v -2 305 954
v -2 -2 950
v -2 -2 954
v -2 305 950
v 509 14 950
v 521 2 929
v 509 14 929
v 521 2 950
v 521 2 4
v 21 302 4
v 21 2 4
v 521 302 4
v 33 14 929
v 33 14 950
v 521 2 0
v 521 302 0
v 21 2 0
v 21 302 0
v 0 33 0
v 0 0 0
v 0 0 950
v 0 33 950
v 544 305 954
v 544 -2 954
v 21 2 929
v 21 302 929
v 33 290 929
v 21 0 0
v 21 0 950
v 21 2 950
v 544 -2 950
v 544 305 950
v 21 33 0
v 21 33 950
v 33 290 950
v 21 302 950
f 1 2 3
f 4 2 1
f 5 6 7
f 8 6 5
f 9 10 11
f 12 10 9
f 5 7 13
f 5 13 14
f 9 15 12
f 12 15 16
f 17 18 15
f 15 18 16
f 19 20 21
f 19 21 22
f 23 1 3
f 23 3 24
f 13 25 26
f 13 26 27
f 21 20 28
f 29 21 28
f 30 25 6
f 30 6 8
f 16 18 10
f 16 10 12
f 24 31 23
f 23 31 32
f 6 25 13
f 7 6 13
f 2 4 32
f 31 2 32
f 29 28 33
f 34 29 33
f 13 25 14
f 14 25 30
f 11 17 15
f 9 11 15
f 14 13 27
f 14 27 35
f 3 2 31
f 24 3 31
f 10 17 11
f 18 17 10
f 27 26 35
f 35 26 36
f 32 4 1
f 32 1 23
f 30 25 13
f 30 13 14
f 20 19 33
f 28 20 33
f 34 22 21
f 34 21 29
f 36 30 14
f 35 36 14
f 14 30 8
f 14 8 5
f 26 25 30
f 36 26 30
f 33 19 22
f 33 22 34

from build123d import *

# Parameters (mm, degrees)
F0_W      = 21
F0_H      = 33
F1_DEPTH  = 950
F3_W      = 12
F3_H      = 21
F4_DEPTH  = 300
F5_SIZE   = 11.99999
F6_W      = 12
F6_H      = 21
F7_DEPTH  = 500
F8_SIZE   = 11.99999
F9_W      = 546
F9_H      = 307
F10_DEPTH = 4
F11_W     = 500
F11_H     = 300
F12_DEPTH = 4


# Not quite as in the source:
# - a fillet or chamfer is up to 0.001 mm smaller than in the source, because OpenCascade refuses the exact size


with BuildPart() as f1:
    # F0 (on Top) → F1 (new body)
    with BuildSketch(Plane.XY):
        with Locations((10.5, 16.5)):
            Rectangle(F0_W, F0_H)
    extrude(amount=F1_DEPTH)


with BuildPart() as f4:
    # F3 (on offset) → F4 (new body)
    with BuildSketch(Plane.XZ.offset(-2)):
        with Locations((27, 939.5)):
            Rectangle(F3_W, F3_H)
    extrude(amount=-F4_DEPTH)

    # F5 (size 12 in the source; OpenCascade refuses exactly that, so slightly less here)
    f5_edges = [f4.edges().sort_by_distance(p)[0] for p in [
        (33, 2, 939.5),
        (33, 302, 939.5),
    ]]
    chamfer(f5_edges, length=F5_SIZE)


with BuildPart() as f7:
    # F6 (on face) → F7 (new body)
    with BuildSketch(Plane.YZ.offset(21)):
        with Locations((8, 939.5)):
            Rectangle(F6_W, F6_H)
    extrude(amount=F7_DEPTH)

    # F8 (size 12 in the source; OpenCascade refuses exactly that, so slightly less here)
    f8_edges = [f7.edges().sort_by_distance(p)[0] for p in [
        (21, 14, 939.5),
        (521, 14, 939.5),
    ]]
    chamfer(f8_edges, length=F8_SIZE)


with BuildPart() as f10:
    # F9 (on face) → F10 (new body)
    with BuildSketch(Plane.XY.offset(950)):
        with Locations((271, 151.5)):
            Rectangle(F9_W, F9_H)
    extrude(amount=F10_DEPTH)


with BuildPart() as f12:
    # F11 (on Top) → F12 (new body)
    with BuildSketch(Plane.XY):
        with Locations((271, 152)):
            Rectangle(F11_W, F11_H)
    extrude(amount=F12_DEPTH)


solid = Compound([f1.part, f4.part, f7.part, f10.part, f12.part])
